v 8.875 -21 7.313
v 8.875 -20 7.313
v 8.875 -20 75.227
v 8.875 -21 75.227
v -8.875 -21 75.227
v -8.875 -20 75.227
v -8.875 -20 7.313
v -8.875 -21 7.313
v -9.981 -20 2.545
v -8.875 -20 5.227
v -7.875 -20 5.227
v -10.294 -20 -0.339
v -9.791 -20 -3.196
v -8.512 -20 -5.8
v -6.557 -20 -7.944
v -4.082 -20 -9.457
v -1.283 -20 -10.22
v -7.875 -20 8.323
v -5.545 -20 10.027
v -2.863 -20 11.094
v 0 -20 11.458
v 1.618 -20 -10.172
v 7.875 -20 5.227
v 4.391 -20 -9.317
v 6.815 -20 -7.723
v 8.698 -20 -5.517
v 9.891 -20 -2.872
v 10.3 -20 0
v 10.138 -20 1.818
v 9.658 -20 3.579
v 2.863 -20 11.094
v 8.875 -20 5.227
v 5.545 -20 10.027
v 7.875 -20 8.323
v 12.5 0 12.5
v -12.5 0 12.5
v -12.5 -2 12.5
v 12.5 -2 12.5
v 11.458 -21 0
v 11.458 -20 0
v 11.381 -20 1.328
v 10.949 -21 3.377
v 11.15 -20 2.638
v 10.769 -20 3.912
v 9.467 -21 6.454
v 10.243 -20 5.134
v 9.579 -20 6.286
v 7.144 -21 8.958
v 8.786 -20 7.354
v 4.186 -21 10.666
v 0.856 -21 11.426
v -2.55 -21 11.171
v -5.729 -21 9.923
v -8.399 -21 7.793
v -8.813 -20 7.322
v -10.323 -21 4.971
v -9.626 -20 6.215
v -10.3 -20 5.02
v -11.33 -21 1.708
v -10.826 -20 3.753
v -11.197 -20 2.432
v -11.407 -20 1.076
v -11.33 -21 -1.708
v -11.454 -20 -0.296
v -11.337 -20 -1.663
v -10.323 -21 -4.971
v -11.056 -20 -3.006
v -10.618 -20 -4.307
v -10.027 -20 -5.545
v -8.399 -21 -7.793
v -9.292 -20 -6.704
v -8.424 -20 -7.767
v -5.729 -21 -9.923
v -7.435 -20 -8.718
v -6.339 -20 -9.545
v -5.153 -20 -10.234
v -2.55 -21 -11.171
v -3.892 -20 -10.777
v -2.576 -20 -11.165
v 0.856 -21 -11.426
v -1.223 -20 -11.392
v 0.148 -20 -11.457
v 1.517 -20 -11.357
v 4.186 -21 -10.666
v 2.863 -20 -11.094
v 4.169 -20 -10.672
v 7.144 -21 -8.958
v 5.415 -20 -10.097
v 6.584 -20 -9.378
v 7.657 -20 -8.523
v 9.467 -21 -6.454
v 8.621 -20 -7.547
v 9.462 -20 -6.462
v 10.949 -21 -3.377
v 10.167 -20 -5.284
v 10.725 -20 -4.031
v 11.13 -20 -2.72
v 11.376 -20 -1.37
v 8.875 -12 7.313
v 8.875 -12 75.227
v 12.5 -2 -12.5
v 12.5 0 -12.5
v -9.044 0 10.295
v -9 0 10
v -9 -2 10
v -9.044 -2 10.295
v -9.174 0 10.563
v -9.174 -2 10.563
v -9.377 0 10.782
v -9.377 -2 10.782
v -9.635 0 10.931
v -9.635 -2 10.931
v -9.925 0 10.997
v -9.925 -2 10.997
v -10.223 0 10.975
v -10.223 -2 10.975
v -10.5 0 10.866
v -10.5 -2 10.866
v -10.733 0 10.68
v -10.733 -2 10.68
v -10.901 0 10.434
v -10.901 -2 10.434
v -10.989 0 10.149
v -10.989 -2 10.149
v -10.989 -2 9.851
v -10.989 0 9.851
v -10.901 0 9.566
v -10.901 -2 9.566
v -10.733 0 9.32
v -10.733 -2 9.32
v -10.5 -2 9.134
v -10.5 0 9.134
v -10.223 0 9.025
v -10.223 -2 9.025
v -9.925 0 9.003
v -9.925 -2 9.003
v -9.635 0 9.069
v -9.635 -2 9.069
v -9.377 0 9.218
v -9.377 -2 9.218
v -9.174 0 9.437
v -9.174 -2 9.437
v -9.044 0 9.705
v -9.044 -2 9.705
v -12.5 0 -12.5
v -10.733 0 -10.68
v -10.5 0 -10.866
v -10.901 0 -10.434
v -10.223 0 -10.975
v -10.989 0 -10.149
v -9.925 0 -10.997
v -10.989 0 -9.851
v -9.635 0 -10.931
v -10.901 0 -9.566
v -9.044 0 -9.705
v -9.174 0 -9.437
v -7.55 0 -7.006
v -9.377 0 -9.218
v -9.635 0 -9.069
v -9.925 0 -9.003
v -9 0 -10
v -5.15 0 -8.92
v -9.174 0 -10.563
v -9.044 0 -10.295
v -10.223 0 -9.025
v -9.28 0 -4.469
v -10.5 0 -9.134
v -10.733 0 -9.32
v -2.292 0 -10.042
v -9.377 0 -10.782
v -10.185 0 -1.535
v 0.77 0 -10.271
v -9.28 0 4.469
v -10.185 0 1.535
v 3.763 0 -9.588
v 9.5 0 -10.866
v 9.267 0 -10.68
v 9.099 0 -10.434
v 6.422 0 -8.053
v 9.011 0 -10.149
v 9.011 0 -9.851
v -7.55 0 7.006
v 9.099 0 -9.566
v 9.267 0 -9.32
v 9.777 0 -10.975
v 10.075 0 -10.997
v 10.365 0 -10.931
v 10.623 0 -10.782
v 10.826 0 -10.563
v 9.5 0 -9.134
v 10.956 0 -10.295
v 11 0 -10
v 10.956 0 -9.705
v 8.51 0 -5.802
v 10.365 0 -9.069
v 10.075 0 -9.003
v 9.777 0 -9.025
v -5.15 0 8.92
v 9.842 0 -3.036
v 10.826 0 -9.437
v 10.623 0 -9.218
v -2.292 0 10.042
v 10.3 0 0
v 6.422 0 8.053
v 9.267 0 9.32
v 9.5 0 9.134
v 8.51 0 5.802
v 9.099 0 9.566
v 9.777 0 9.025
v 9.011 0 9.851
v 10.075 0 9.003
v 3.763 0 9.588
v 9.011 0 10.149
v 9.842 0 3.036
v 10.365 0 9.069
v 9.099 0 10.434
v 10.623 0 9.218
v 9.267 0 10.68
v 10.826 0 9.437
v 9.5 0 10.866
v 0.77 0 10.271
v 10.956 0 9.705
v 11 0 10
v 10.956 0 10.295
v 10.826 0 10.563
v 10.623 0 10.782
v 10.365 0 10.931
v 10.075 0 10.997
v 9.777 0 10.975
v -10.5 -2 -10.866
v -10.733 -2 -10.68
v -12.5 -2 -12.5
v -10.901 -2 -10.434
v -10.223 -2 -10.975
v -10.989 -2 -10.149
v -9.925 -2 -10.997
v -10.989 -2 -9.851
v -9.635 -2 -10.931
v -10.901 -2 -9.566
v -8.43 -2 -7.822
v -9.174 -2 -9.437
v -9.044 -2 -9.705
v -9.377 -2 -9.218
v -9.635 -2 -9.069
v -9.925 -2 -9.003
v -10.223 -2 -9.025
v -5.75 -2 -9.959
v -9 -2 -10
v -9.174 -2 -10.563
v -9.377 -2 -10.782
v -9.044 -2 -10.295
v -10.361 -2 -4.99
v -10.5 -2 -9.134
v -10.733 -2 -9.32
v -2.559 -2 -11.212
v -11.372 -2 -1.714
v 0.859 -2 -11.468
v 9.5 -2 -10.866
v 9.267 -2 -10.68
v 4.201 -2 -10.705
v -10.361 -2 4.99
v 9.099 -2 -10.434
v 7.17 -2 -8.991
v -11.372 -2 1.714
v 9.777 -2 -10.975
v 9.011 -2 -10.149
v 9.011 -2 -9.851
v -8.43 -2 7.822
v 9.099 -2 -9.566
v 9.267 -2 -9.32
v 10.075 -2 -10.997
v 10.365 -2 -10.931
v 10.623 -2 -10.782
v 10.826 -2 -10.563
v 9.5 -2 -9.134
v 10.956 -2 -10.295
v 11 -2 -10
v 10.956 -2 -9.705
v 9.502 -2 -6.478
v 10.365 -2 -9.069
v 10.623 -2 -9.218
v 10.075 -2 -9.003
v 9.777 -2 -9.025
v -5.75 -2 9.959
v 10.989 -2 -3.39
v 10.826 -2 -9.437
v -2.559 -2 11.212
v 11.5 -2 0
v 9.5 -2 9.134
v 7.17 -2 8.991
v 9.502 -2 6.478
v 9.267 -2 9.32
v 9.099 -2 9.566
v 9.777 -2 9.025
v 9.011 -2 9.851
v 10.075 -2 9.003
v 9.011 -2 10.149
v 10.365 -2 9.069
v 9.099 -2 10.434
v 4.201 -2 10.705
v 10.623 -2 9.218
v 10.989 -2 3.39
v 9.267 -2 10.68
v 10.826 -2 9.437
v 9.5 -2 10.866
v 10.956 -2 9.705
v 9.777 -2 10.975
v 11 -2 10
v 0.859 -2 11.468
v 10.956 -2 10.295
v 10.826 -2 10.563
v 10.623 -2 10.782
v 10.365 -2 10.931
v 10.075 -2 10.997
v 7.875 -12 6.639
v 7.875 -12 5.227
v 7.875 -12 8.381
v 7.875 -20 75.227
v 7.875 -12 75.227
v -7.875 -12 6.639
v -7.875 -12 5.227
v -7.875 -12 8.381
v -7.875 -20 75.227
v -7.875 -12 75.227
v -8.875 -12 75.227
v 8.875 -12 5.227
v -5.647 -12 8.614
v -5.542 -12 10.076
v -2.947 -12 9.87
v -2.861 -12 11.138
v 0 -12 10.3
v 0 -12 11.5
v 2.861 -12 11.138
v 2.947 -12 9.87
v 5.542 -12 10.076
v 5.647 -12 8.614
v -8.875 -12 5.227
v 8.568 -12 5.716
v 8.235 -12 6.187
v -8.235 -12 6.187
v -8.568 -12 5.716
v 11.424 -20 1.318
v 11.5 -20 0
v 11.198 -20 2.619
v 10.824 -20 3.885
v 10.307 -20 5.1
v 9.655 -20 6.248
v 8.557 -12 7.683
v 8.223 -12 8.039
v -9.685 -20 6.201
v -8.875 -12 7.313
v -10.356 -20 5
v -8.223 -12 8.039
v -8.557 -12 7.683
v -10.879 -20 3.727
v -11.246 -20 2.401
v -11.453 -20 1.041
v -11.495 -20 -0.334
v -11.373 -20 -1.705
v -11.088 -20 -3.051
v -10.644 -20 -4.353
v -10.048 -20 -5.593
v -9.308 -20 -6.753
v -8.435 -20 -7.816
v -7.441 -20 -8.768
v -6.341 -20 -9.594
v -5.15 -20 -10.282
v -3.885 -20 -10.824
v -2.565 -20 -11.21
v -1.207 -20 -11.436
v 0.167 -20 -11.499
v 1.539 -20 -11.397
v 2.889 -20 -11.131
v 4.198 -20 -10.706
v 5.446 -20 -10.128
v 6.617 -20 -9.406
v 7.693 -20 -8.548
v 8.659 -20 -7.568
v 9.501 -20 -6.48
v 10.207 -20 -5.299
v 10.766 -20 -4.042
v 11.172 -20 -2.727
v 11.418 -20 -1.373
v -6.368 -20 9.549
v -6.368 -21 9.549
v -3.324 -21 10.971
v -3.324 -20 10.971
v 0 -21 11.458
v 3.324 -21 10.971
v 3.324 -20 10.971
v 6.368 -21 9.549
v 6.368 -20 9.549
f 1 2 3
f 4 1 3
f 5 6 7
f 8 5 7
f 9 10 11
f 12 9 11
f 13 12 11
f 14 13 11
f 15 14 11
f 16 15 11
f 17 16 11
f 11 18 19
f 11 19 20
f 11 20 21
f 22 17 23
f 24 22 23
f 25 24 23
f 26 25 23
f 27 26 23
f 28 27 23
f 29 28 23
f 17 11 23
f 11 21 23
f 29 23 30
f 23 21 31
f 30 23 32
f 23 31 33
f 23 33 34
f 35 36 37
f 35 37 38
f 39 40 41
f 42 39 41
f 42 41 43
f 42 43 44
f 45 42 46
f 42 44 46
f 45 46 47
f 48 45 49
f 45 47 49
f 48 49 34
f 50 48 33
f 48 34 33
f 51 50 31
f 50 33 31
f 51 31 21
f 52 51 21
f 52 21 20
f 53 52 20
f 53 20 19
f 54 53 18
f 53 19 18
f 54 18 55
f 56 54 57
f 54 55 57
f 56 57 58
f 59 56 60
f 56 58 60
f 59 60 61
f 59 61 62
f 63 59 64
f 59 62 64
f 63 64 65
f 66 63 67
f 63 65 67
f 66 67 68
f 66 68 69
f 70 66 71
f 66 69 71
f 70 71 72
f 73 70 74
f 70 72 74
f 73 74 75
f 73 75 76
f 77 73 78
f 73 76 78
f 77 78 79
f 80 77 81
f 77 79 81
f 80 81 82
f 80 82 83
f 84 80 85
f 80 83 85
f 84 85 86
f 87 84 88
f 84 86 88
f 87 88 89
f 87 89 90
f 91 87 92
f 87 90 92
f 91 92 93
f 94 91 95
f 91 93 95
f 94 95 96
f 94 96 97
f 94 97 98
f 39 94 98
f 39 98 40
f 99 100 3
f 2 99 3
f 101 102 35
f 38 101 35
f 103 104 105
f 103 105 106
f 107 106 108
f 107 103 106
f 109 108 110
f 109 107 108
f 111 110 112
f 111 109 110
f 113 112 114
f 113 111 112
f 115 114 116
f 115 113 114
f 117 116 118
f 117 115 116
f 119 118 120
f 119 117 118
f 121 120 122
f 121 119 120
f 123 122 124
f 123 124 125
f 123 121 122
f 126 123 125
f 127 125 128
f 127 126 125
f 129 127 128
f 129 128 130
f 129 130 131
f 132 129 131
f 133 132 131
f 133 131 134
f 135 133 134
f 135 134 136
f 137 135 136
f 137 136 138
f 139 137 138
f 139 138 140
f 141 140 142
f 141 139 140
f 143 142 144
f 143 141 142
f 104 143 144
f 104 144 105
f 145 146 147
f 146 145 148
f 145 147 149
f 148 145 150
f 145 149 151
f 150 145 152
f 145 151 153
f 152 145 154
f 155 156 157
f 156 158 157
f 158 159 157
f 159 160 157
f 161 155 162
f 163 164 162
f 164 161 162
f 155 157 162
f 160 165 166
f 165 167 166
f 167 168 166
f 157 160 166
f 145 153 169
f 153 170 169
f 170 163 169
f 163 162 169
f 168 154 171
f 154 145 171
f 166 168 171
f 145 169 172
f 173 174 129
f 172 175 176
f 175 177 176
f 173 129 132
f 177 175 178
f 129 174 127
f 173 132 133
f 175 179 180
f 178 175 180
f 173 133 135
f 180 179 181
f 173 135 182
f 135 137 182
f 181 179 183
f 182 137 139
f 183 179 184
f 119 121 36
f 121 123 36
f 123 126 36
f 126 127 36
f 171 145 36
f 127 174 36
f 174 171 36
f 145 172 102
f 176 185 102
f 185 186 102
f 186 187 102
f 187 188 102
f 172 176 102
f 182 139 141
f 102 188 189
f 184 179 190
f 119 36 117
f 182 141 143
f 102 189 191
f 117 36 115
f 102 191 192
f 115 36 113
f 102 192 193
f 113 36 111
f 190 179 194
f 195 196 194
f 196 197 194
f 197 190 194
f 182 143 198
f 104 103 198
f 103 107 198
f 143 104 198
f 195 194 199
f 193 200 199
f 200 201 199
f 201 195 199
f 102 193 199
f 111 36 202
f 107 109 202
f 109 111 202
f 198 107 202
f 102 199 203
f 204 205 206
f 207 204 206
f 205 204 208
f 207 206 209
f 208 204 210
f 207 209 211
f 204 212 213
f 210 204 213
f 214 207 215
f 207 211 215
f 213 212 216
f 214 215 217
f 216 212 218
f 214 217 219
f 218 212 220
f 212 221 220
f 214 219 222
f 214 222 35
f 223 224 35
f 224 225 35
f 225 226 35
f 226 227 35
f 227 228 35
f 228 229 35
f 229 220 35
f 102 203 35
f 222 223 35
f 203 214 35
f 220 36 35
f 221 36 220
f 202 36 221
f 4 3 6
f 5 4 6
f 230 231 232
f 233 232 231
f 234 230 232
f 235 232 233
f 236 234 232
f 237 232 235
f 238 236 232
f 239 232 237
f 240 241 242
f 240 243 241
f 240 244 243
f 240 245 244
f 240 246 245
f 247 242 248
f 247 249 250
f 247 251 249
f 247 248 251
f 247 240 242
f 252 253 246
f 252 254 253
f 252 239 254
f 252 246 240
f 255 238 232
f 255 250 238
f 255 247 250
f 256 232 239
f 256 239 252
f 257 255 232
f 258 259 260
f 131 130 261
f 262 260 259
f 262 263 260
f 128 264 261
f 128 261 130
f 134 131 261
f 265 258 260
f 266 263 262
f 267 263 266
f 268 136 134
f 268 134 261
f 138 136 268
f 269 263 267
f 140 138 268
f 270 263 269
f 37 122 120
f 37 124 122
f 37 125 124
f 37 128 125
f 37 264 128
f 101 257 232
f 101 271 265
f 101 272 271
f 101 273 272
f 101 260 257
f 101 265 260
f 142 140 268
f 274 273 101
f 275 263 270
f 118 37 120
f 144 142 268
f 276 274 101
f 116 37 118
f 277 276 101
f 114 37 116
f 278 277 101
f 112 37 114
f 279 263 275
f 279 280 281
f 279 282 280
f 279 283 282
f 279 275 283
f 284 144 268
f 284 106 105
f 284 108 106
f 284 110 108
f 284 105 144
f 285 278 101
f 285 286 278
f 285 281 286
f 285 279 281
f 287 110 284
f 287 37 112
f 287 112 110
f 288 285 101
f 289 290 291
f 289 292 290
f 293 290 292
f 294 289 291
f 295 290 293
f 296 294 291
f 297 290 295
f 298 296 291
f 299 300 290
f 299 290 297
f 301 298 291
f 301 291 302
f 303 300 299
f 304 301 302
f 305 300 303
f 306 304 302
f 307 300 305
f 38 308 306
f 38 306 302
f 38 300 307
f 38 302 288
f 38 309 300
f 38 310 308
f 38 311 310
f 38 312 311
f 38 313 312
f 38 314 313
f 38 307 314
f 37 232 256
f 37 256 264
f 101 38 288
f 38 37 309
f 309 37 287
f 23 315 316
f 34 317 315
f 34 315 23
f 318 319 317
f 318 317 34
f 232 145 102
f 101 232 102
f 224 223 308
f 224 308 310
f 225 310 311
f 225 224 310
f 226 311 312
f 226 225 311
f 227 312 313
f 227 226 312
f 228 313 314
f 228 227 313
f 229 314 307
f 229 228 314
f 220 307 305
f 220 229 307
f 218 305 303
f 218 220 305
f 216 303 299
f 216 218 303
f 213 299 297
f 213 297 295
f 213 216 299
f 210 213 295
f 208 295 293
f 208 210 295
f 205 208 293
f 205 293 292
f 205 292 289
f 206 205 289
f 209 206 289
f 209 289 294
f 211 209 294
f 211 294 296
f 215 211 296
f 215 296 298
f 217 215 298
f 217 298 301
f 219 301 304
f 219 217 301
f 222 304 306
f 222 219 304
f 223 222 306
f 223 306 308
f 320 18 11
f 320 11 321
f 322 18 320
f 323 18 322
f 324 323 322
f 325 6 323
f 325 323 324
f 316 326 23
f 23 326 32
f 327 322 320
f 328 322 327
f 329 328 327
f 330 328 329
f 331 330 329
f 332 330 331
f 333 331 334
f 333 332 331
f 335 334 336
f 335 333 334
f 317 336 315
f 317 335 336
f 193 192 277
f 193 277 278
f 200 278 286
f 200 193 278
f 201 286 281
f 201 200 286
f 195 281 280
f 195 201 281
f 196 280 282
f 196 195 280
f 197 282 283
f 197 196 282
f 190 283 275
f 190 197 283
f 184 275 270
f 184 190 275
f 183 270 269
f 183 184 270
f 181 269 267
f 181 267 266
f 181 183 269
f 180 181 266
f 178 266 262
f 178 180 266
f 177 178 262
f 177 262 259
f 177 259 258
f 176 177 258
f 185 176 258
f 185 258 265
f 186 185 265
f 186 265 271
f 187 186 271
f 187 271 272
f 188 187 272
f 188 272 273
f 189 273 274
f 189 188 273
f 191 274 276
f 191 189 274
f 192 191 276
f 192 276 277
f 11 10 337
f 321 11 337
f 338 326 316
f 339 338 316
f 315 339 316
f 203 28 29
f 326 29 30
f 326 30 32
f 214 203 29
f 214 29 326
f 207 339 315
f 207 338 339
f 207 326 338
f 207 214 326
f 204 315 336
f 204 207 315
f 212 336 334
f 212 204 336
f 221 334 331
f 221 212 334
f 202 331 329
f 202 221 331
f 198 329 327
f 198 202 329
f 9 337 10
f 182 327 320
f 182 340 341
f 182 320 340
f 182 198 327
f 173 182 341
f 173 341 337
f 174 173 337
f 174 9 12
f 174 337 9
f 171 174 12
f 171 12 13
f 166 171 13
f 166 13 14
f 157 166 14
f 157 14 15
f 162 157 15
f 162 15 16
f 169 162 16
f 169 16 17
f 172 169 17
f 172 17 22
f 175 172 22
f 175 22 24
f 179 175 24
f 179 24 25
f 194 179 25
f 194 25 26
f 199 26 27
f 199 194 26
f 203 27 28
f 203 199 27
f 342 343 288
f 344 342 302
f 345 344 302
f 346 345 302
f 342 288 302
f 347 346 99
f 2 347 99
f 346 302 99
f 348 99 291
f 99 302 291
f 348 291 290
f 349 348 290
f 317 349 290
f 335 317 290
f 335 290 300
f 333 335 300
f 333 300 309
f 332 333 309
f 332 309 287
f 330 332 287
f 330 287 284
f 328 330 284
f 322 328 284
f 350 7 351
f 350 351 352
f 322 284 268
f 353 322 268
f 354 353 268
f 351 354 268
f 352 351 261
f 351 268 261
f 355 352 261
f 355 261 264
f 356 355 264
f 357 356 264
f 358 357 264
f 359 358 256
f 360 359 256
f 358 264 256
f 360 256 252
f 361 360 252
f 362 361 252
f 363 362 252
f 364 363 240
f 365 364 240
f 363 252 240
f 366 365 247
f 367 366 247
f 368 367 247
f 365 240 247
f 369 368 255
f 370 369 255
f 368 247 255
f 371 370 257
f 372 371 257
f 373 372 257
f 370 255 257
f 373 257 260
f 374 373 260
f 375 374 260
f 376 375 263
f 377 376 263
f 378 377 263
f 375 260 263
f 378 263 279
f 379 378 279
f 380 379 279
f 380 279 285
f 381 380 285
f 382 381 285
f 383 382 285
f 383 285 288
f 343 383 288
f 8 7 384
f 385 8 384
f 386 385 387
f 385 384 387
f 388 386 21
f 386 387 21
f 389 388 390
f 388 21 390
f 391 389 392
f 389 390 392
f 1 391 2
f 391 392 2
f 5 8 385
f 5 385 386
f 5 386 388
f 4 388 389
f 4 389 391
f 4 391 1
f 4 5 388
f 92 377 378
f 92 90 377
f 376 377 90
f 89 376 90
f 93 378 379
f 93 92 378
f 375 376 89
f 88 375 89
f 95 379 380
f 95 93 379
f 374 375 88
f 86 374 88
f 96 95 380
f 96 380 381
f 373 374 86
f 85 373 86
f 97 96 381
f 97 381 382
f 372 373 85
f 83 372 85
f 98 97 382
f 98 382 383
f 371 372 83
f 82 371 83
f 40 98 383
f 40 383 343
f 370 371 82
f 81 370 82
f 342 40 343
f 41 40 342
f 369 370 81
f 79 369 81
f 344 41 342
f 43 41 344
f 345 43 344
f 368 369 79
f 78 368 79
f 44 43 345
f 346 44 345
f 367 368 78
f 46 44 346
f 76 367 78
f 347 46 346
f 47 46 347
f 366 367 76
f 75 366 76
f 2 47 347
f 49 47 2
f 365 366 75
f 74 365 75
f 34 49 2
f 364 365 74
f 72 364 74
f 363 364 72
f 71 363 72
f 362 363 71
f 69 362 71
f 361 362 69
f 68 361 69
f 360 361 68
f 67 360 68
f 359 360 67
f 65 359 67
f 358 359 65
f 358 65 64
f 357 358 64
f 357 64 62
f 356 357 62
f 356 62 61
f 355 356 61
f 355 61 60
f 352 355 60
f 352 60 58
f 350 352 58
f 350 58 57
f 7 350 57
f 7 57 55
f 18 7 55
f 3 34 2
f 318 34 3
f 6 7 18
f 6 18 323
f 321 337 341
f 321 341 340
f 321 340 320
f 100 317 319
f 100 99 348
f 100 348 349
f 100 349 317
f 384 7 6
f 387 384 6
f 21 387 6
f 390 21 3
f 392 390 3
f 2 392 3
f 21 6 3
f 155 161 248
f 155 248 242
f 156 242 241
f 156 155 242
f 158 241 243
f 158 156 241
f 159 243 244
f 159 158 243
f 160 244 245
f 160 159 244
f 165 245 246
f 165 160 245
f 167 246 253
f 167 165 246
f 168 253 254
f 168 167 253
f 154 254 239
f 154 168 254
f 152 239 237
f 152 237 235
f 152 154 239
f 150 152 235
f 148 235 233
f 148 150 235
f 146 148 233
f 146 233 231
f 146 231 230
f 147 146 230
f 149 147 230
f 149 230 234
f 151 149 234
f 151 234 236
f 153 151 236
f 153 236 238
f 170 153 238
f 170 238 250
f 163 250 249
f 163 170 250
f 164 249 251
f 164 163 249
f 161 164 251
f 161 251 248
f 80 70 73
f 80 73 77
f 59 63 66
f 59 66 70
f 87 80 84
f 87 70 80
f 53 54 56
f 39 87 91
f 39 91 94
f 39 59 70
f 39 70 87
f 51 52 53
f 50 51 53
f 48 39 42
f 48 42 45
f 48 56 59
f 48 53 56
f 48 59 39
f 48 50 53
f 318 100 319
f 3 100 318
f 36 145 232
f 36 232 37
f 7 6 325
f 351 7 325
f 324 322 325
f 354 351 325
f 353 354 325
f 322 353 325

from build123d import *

# Parameters (mm, degrees)
F0_R      = 11.5
F0_R_2    = 10.3
F1_DEPTH  = 20
F0_W      = 25
F0_H      = 25
F0_R_3    = 1
F2_DEPTH  = 2
F4_DEPTH  = 8
F5_R      = 11.457854
F6_DEPTH  = 1
F8_W      = 8
F8_H      = 70
F9_DEPTH  = 1
F7_W      = 8
F7_H      = 70
F10_DEPTH = 1
F12_DEPTH = 1


with BuildPart() as f1:
    # F0 (on Front) → F1 (new body)
    with BuildSketch(Plane.XZ):
        Circle(F0_R)
        Circle(F0_R_2, mode=Mode.SUBTRACT)
    extrude(amount=F1_DEPTH)

    # F0 (on Front) → F2 (join)
    with BuildSketch(Plane.XZ):
        Rectangle(F0_W, F0_H)
        with Locations((-10, -10)):
            Circle(F0_R_3, mode=Mode.SUBTRACT)
        with Locations((10, -10)):
            Circle(F0_R_3, mode=Mode.SUBTRACT)
        with Locations((-10, 10)):
            Circle(F0_R_3, mode=Mode.SUBTRACT)
        Circle(F0_R, mode=Mode.SUBTRACT)
        with Locations((10, 10)):
            Circle(F0_R_3, mode=Mode.SUBTRACT)
    extrude(amount=F2_DEPTH)

    # F3 (on face) → F4 (cut)
    with BuildSketch(Plane.XZ.offset(20)):
        with BuildLine():
            ThreePointArc((8.875, 7.313301), (0, 11.5), (-8.875, 7.313301))
            Line((-8.875, 7.313301), (-8.875, 5.227272))
            ThreePointArc((-8.875, 5.227272), (0, 10.3), (8.875, 5.227272))
            Line((8.875, 5.227272), (8.875, 7.313301))
        make_face()
    extrude(amount=-F4_DEPTH, mode=Mode.SUBTRACT)

    # F5 (on face) → F6 (join)
    with BuildSketch(Plane.XZ.offset(20)):
        Circle(F5_R)
    extrude(amount=F6_DEPTH)

    # F8 (on face) → F9 (join)
    with BuildSketch(Plane(origin=(8.875, 0, 0), x_dir=(0, -1, 0), z_dir=(-1, 0, 0))):
        with Locations((16, 40.227272)):
            Rectangle(F8_W, F8_H)
    extrude(amount=F9_DEPTH)

    # F7 (on face) → F10 (join)
    with BuildSketch(Plane.YZ.offset(-8.875)):
        with Locations((-16, 40.227272)):
            Rectangle(F7_W, F7_H)
    extrude(amount=F10_DEPTH)


with BuildPart() as f12:
    # F11 (on face) → F12 (new body)
    with BuildSketch(Plane.XZ.offset(20)):
        with BuildLine():
            Line((8.875, 75.227272), (-8.875, 75.227272))
            Line((-8.875, 75.227272), (-8.875, 7.313301))
            ThreePointArc((-8.875, 7.313301), (0, 11.458159), (8.875, 7.313301))
            Line((8.875, 7.313301), (8.875, 75.227272))
        make_face()
    extrude(amount=F12_DEPTH)


solid = Compound([f1.part, f12.part])
